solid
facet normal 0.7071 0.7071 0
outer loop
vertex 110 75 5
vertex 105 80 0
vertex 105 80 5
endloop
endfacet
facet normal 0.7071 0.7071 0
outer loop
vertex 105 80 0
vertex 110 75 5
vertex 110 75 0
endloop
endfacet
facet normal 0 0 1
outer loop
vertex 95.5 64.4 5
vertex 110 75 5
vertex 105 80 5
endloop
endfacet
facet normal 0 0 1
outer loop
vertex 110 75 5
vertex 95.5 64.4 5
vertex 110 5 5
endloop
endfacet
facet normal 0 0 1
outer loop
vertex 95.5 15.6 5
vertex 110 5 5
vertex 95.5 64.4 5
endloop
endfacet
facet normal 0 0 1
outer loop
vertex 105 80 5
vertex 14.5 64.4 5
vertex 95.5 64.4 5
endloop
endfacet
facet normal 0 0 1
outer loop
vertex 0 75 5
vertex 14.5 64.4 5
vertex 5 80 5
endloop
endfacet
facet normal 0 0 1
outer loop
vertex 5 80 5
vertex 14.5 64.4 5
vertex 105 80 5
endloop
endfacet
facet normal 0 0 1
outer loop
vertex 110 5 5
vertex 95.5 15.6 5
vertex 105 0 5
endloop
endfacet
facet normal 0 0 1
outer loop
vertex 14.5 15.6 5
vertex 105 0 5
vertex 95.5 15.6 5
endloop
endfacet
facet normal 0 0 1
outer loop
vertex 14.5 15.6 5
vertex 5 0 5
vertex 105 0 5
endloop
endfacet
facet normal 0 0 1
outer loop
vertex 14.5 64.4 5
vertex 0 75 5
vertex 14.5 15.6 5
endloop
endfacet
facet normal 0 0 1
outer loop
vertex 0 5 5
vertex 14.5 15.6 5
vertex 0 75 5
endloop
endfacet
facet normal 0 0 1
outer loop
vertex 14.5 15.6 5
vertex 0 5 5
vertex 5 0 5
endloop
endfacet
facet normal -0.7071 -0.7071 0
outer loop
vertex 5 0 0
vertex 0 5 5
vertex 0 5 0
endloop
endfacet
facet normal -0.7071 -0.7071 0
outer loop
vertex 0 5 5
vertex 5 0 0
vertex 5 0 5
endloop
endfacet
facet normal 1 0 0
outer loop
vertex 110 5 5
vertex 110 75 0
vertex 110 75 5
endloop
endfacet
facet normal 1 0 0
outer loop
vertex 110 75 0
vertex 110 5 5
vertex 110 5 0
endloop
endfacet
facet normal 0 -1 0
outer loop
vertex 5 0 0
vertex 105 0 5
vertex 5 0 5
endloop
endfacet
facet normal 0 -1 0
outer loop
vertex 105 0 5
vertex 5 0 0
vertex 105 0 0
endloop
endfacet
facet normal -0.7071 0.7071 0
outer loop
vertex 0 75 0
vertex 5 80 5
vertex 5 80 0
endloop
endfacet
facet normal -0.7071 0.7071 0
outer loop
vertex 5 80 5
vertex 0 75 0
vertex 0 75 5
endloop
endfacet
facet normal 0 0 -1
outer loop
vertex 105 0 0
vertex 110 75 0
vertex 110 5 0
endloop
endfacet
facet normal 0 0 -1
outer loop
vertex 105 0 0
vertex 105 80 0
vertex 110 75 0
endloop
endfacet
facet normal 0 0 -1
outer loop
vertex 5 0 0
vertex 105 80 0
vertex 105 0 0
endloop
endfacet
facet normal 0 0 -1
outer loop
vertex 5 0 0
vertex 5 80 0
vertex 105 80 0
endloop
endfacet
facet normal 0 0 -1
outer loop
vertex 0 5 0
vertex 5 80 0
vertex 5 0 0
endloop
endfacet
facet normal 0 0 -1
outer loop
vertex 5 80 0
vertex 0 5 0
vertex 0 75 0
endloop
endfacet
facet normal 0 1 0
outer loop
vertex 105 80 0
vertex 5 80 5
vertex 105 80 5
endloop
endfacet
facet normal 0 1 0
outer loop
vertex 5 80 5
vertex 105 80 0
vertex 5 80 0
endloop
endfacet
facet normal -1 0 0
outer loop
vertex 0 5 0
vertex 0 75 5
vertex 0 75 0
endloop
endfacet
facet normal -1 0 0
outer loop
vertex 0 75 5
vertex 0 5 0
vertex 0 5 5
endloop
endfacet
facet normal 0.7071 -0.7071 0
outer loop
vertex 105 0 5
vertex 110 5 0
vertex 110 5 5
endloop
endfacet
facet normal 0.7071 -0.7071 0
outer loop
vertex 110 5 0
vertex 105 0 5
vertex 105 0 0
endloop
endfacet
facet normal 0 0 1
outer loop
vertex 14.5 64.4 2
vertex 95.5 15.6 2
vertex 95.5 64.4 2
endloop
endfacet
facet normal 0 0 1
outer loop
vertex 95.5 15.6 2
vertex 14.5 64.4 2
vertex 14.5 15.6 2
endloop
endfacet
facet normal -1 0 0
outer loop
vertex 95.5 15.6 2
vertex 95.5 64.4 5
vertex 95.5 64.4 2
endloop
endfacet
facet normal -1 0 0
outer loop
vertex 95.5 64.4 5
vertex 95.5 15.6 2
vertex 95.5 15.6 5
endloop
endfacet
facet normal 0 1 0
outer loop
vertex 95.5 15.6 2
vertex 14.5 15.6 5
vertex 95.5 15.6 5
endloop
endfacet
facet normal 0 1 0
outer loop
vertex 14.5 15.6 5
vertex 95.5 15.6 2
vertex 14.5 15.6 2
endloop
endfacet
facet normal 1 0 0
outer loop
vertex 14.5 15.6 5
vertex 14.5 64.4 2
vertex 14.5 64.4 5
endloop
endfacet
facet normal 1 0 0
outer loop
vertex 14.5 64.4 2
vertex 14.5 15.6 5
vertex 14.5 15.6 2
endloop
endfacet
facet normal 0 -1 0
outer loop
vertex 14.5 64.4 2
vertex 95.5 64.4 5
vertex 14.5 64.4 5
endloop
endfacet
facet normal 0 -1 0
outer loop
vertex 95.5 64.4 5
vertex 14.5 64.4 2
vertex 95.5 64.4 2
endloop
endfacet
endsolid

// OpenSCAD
$fn = 32;

// ----------------------------------------------------------------------
// Windowed plate: 1 voids, 110 x 80 x 5 mm
// ----------------------------------------------------------------------

// --- parameters (mm) ---
plate_l = 110;            // plate length, X
plate_w = 80;             // plate width, Y
plate_t = 5;              // plate thickness, Z
edge_margin = 10;         // wall from the plate edge to any window
win1_l = 81;              // window length
win1_w = 48.8;            // window width
depth_1 = 3;              // depth of void 1 (full thickness = through)
corner_c = 5;             // corner chamfer of the plate

profile = [[5, 0], [105, 0], [110, 5], [110, 75], [105, 80], [5, 80], [0, 75], [0, 5]];  // primary outline, 8 points, counter clockwise
void_1 = [[14.5, 15.6], [95.5, 15.6], [95.5, 64.4], [14.5, 64.4]];  // large central window, 4 points

// --- the one profile operation ---
difference() {
  linear_extrude(height = plate_t) polygon(points = profile);
  translate([0, 0, plate_t - depth_1])
    linear_extrude(height = depth_1 + 1) polygon(points = void_1);
}
